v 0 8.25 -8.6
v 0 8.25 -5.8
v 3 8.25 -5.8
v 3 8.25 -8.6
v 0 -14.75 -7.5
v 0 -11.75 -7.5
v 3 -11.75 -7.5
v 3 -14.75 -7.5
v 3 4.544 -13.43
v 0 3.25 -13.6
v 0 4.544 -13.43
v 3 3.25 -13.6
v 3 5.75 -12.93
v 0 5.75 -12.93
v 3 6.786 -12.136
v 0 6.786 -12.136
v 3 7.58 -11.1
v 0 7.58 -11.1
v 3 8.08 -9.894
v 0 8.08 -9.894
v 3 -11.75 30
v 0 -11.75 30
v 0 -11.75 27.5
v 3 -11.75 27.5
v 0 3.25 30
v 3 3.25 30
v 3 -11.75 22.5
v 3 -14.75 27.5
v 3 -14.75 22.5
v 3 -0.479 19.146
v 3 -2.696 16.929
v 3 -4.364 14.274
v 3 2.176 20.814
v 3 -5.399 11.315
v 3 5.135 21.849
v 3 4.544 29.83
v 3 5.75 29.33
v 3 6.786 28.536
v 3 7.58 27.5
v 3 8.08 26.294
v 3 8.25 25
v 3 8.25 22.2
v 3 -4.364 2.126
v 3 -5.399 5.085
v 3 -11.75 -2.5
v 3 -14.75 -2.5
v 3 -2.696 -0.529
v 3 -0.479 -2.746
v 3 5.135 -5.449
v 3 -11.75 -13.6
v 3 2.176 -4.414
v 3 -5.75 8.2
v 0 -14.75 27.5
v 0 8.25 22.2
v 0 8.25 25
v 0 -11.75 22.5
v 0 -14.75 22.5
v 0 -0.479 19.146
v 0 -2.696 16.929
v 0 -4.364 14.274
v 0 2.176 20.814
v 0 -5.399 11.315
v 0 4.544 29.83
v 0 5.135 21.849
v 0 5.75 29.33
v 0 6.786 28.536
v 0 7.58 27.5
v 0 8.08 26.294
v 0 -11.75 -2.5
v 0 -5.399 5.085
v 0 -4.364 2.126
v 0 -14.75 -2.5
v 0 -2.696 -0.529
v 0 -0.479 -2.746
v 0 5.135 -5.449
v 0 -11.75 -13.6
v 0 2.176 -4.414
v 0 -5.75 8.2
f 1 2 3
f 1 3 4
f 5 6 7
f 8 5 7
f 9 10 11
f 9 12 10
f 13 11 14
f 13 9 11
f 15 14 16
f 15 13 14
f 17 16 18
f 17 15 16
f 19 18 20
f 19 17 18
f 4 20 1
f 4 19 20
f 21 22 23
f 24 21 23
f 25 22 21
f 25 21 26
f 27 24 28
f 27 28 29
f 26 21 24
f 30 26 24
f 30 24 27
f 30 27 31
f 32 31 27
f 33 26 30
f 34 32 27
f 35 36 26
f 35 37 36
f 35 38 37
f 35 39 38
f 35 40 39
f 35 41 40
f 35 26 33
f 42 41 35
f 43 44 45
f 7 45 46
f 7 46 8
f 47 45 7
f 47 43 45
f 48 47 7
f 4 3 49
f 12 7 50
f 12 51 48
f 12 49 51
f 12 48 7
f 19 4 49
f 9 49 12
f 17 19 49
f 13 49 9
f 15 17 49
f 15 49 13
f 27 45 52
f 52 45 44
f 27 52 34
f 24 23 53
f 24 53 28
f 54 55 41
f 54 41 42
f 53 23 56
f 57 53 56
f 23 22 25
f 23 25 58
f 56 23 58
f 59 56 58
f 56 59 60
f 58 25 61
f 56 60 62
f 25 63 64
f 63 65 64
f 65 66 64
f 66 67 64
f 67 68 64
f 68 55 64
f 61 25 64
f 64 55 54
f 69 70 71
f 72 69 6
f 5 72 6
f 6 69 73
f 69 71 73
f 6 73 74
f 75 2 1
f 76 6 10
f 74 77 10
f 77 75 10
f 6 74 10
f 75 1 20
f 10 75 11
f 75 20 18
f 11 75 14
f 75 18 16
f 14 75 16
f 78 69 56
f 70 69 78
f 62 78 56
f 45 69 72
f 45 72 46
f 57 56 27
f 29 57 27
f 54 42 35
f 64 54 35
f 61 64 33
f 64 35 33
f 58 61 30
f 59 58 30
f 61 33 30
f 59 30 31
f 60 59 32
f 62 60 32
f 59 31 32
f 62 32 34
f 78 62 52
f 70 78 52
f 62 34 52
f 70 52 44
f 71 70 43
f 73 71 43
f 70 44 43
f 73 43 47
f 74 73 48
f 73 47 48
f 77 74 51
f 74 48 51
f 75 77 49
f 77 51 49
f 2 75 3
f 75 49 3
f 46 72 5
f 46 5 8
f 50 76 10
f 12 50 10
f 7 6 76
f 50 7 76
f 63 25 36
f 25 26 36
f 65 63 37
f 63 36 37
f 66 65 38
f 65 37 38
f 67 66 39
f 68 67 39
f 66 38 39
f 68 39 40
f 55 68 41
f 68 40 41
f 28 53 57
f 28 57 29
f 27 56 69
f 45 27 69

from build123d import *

# Parameters (mm, degrees)
SKETCH1_W           = 43.6
SKETCH1_H           = 20
BOSS_EXTRUDE1_DEPTH = 3
SKETCH4_R           = 14
CUT_EXTRUDE1_DEPTH  = 4
FILLET1_R           = 5
SKETCH3_W           = 3
SKETCH3_H           = 5
BOSS_EXTRUDE2_DEPTH = 3
LPATTERN1_COUNT     = 2
LPATTERN1_PITCH     = 30


with BuildPart() as part:
    # Sketch1 → Boss-Extrude1 (new body)
    with BuildSketch(Plane(origin=(0, 0, 0), x_dir=(0, 0, -1), z_dir=(1, 0, 0))):
        with Locations((-8.2, -1.75)):
            Rectangle(SKETCH1_W, SKETCH1_H)
    extrude(amount=BOSS_EXTRUDE1_DEPTH)

    # Sketch4 → Cut-Extrude1 (cut, through all)
    with BuildSketch(Plane(origin=(3, 0, 0), x_dir=(0, 0, -1), z_dir=(1, 0, 0))):
        with Locations((-8.2, 8.25)):
            Circle(SKETCH4_R)
    extrude(amount=-CUT_EXTRUDE1_DEPTH, mode=Mode.SUBTRACT)

    # Fillet1
    fillet1_edges = [part.edges().sort_by_distance(p)[0] for p in [
        (1.5, 8.25, 30),
        (1.5, 8.25, -13.6),
    ]]
    fillet(fillet1_edges, radius=FILLET1_R)

    # Sketch3 → Boss-Extrude2 (add)
    with BuildSketch(Plane.XZ.offset(11.75)):
        with Locations((1.5, 25)):
            Rectangle(SKETCH3_W, SKETCH3_H)
    boss_extrude2 = extrude(amount=BOSS_EXTRUDE2_DEPTH)

    # LPattern1: Boss-Extrude2 ×2
    with Locations(*[(0, 0, -i * LPATTERN1_PITCH) for i in range(1, LPATTERN1_COUNT)]):
        add(boss_extrude2)


solid = part.part
